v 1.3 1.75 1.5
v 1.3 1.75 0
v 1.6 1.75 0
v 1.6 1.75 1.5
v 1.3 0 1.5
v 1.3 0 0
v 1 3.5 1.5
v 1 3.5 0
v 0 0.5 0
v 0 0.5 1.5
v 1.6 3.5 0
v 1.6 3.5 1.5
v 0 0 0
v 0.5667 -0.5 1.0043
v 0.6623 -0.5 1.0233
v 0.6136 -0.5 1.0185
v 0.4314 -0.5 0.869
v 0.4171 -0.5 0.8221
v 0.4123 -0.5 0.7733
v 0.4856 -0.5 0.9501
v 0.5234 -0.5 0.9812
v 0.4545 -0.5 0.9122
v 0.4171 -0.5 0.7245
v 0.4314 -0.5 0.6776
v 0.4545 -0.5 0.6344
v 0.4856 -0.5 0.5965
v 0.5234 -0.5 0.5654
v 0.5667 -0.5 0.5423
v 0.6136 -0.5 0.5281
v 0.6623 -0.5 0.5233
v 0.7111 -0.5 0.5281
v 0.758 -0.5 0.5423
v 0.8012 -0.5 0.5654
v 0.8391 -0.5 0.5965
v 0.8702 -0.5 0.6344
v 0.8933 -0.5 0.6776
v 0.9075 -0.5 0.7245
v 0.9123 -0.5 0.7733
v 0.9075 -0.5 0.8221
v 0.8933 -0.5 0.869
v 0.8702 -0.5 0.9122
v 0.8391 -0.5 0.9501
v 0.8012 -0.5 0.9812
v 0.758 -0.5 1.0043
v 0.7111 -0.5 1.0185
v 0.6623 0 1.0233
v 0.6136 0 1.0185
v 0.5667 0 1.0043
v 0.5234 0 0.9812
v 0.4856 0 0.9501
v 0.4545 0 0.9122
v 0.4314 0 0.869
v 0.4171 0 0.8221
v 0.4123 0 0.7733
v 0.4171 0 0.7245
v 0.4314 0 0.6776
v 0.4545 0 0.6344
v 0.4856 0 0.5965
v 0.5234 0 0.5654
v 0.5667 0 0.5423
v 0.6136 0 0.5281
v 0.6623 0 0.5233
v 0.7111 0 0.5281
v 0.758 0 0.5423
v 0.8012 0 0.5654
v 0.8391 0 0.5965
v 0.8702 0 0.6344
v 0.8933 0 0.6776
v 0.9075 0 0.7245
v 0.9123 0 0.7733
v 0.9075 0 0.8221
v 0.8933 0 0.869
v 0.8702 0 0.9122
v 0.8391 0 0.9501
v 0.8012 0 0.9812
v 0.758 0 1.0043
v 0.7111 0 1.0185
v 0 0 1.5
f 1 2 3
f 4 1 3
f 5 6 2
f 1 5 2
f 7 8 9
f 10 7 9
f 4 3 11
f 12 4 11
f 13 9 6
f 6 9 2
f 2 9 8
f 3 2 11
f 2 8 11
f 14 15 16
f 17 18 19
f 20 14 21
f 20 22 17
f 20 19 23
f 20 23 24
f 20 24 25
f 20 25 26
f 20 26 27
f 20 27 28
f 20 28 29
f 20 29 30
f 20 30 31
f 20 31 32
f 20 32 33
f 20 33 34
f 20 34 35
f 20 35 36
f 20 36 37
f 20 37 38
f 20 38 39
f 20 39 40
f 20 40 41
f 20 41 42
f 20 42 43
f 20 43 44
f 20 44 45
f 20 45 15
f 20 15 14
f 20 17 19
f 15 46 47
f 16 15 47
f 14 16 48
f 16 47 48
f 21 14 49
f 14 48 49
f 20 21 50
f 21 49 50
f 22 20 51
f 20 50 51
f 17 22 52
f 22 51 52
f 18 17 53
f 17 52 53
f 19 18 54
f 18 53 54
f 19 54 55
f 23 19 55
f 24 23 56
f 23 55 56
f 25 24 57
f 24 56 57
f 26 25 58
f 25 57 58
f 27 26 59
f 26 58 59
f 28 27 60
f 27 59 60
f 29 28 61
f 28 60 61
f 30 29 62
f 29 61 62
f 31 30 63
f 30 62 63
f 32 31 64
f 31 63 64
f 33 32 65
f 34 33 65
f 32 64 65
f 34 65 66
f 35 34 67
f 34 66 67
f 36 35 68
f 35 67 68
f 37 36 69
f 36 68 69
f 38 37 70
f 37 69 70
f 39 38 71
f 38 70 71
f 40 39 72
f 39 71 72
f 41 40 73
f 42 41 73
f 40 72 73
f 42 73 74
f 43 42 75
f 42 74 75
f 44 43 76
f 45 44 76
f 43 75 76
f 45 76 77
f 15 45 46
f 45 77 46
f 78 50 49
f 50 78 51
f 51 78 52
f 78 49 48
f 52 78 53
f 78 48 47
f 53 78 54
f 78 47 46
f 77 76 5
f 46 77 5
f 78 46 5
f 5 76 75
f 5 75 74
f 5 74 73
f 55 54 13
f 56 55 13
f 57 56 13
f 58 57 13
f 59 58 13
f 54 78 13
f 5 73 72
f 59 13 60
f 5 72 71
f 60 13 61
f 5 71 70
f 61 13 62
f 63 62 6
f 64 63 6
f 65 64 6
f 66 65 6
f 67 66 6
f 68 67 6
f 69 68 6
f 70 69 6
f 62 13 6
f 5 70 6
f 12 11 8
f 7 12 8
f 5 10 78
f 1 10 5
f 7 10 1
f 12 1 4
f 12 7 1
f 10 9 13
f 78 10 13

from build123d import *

# Parameters (mm, degrees)
BOSS_EXTRUDE1_DEPTH = 1.5
SKETCH2_R           = 0.25
BOSS_EXTRUDE2_DEPTH = 0.5


with BuildPart() as part:
    # Sketch1 → Boss-Extrude1 (new body)
    with BuildSketch(Plane.XY):
        Polygon((0, 0), (1.3, 0), (1.3, 1.75), (1.6, 1.75), (1.6, 3.5), (1.3, 3.5), (1, 3.5), (0, 0.5), align=None)
    extrude(amount=BOSS_EXTRUDE1_DEPTH)

    # Sketch2 → Boss-Extrude2 (add)
    with BuildSketch(Plane.XZ):
        with Locations(Location((0.662330501, 0.773316301, 0), (0, 0, 90))):
            Circle(SKETCH2_R)
    extrude(amount=BOSS_EXTRUDE2_DEPTH)


solid = part.part
